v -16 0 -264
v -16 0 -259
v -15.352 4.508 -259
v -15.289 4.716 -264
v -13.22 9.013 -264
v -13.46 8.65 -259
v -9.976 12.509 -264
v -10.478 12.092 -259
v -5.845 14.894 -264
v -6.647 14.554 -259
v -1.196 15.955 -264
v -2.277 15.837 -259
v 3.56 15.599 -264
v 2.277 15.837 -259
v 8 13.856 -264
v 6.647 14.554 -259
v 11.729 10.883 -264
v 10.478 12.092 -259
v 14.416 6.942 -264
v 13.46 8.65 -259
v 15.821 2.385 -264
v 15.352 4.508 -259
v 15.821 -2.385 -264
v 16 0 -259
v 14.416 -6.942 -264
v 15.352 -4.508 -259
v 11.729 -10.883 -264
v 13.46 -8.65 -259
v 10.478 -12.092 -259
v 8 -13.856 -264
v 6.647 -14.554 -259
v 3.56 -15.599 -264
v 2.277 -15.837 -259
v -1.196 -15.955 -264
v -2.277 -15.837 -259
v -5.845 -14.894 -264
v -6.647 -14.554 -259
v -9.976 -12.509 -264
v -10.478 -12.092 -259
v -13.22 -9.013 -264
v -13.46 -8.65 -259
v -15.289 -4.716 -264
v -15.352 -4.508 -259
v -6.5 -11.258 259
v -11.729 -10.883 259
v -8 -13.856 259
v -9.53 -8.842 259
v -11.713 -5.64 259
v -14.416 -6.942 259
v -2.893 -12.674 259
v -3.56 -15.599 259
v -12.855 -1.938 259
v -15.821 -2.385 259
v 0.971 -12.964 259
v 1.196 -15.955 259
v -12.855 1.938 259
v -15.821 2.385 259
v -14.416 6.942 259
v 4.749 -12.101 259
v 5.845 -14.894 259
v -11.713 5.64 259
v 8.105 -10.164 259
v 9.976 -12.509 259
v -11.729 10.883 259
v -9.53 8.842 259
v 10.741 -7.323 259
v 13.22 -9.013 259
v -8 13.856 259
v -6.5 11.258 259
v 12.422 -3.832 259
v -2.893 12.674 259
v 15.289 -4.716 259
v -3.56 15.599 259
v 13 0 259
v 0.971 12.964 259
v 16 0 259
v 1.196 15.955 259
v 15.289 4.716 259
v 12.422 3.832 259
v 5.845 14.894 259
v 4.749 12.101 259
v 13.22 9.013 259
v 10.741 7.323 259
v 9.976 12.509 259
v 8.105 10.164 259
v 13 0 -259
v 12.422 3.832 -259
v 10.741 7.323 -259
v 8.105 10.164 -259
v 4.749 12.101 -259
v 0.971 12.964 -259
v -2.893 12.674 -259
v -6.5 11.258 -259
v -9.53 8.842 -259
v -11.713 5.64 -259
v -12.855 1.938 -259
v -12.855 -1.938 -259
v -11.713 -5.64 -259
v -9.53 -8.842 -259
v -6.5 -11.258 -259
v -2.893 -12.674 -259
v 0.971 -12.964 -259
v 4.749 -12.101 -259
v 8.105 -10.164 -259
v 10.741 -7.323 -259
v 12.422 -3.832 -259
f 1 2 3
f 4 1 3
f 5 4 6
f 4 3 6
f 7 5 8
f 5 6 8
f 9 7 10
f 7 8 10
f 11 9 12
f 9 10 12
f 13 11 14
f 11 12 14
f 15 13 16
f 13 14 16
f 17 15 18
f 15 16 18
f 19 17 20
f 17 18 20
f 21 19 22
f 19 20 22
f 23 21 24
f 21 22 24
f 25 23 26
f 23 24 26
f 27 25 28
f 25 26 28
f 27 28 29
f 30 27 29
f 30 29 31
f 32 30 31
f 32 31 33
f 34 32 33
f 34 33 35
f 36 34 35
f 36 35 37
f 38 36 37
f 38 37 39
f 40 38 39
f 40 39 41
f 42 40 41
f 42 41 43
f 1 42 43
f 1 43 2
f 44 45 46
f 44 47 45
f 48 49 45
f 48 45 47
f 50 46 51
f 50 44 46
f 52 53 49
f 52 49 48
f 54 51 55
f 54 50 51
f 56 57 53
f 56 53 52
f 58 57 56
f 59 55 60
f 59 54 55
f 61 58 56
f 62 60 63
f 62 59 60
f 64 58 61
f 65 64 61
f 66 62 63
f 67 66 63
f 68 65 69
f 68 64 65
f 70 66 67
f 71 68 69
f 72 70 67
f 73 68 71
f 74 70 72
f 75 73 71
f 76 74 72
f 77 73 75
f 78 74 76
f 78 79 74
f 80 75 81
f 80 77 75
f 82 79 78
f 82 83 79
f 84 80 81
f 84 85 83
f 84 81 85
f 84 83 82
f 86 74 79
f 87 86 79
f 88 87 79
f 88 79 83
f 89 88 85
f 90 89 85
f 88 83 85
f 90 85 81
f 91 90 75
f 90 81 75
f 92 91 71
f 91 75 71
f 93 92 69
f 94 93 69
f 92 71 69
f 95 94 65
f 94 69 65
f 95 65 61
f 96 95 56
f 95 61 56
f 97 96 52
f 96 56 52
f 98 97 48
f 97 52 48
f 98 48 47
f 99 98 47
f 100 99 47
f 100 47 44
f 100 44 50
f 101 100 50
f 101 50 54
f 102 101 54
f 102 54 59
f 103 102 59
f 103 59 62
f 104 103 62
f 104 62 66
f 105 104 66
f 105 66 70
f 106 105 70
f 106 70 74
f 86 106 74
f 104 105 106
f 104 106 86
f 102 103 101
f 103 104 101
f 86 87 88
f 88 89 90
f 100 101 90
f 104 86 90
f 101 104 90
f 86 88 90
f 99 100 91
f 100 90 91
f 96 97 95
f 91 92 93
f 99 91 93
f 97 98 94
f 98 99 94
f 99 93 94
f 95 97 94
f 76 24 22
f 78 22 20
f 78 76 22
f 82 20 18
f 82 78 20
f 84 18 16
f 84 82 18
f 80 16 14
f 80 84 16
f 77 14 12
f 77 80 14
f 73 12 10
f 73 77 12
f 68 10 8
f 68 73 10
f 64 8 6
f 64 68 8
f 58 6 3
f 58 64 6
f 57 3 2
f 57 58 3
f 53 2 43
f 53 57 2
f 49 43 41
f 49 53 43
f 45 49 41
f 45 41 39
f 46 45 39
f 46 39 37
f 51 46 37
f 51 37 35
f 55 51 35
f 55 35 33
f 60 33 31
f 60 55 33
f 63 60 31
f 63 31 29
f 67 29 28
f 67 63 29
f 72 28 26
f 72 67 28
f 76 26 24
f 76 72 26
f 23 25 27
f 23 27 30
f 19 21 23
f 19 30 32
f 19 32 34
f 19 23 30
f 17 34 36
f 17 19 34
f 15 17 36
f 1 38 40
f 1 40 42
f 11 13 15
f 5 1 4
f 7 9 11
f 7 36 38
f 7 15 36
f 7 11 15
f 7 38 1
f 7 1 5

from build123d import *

# Parameters (mm, degrees)
CROQUIS1_R     = 16
EXTRUIR1_DEPTH = 259
VACIADO1_T     = -3
CROQUIS2_R     = 16
EXTRUIR2_DEPTH = 5


with BuildPart() as part:
    # Croquis1 → Extruir1 (new, symmetric)
    with BuildSketch(Plane.XY):
        Circle(CROQUIS1_R)
    extrude(amount=EXTRUIR1_DEPTH, both=True)

    # Vaciado1
    vaciado1_openings = [part.faces().sort_by_distance(p)[0] for p in [
        (0, 0, 259),
        (0, 0, -259),
    ]]
    offset(amount=VACIADO1_T, openings=vaciado1_openings, kind=Kind.INTERSECTION)

    # Croquis2 → Extruir2 (add)
    with BuildSketch(Plane(origin=(0, 0, -259), x_dir=(-1, 0, 0), z_dir=(0, 0, -1))):
        Circle(CROQUIS2_R)
    extrude(amount=EXTRUIR2_DEPTH)


solid = part.part
